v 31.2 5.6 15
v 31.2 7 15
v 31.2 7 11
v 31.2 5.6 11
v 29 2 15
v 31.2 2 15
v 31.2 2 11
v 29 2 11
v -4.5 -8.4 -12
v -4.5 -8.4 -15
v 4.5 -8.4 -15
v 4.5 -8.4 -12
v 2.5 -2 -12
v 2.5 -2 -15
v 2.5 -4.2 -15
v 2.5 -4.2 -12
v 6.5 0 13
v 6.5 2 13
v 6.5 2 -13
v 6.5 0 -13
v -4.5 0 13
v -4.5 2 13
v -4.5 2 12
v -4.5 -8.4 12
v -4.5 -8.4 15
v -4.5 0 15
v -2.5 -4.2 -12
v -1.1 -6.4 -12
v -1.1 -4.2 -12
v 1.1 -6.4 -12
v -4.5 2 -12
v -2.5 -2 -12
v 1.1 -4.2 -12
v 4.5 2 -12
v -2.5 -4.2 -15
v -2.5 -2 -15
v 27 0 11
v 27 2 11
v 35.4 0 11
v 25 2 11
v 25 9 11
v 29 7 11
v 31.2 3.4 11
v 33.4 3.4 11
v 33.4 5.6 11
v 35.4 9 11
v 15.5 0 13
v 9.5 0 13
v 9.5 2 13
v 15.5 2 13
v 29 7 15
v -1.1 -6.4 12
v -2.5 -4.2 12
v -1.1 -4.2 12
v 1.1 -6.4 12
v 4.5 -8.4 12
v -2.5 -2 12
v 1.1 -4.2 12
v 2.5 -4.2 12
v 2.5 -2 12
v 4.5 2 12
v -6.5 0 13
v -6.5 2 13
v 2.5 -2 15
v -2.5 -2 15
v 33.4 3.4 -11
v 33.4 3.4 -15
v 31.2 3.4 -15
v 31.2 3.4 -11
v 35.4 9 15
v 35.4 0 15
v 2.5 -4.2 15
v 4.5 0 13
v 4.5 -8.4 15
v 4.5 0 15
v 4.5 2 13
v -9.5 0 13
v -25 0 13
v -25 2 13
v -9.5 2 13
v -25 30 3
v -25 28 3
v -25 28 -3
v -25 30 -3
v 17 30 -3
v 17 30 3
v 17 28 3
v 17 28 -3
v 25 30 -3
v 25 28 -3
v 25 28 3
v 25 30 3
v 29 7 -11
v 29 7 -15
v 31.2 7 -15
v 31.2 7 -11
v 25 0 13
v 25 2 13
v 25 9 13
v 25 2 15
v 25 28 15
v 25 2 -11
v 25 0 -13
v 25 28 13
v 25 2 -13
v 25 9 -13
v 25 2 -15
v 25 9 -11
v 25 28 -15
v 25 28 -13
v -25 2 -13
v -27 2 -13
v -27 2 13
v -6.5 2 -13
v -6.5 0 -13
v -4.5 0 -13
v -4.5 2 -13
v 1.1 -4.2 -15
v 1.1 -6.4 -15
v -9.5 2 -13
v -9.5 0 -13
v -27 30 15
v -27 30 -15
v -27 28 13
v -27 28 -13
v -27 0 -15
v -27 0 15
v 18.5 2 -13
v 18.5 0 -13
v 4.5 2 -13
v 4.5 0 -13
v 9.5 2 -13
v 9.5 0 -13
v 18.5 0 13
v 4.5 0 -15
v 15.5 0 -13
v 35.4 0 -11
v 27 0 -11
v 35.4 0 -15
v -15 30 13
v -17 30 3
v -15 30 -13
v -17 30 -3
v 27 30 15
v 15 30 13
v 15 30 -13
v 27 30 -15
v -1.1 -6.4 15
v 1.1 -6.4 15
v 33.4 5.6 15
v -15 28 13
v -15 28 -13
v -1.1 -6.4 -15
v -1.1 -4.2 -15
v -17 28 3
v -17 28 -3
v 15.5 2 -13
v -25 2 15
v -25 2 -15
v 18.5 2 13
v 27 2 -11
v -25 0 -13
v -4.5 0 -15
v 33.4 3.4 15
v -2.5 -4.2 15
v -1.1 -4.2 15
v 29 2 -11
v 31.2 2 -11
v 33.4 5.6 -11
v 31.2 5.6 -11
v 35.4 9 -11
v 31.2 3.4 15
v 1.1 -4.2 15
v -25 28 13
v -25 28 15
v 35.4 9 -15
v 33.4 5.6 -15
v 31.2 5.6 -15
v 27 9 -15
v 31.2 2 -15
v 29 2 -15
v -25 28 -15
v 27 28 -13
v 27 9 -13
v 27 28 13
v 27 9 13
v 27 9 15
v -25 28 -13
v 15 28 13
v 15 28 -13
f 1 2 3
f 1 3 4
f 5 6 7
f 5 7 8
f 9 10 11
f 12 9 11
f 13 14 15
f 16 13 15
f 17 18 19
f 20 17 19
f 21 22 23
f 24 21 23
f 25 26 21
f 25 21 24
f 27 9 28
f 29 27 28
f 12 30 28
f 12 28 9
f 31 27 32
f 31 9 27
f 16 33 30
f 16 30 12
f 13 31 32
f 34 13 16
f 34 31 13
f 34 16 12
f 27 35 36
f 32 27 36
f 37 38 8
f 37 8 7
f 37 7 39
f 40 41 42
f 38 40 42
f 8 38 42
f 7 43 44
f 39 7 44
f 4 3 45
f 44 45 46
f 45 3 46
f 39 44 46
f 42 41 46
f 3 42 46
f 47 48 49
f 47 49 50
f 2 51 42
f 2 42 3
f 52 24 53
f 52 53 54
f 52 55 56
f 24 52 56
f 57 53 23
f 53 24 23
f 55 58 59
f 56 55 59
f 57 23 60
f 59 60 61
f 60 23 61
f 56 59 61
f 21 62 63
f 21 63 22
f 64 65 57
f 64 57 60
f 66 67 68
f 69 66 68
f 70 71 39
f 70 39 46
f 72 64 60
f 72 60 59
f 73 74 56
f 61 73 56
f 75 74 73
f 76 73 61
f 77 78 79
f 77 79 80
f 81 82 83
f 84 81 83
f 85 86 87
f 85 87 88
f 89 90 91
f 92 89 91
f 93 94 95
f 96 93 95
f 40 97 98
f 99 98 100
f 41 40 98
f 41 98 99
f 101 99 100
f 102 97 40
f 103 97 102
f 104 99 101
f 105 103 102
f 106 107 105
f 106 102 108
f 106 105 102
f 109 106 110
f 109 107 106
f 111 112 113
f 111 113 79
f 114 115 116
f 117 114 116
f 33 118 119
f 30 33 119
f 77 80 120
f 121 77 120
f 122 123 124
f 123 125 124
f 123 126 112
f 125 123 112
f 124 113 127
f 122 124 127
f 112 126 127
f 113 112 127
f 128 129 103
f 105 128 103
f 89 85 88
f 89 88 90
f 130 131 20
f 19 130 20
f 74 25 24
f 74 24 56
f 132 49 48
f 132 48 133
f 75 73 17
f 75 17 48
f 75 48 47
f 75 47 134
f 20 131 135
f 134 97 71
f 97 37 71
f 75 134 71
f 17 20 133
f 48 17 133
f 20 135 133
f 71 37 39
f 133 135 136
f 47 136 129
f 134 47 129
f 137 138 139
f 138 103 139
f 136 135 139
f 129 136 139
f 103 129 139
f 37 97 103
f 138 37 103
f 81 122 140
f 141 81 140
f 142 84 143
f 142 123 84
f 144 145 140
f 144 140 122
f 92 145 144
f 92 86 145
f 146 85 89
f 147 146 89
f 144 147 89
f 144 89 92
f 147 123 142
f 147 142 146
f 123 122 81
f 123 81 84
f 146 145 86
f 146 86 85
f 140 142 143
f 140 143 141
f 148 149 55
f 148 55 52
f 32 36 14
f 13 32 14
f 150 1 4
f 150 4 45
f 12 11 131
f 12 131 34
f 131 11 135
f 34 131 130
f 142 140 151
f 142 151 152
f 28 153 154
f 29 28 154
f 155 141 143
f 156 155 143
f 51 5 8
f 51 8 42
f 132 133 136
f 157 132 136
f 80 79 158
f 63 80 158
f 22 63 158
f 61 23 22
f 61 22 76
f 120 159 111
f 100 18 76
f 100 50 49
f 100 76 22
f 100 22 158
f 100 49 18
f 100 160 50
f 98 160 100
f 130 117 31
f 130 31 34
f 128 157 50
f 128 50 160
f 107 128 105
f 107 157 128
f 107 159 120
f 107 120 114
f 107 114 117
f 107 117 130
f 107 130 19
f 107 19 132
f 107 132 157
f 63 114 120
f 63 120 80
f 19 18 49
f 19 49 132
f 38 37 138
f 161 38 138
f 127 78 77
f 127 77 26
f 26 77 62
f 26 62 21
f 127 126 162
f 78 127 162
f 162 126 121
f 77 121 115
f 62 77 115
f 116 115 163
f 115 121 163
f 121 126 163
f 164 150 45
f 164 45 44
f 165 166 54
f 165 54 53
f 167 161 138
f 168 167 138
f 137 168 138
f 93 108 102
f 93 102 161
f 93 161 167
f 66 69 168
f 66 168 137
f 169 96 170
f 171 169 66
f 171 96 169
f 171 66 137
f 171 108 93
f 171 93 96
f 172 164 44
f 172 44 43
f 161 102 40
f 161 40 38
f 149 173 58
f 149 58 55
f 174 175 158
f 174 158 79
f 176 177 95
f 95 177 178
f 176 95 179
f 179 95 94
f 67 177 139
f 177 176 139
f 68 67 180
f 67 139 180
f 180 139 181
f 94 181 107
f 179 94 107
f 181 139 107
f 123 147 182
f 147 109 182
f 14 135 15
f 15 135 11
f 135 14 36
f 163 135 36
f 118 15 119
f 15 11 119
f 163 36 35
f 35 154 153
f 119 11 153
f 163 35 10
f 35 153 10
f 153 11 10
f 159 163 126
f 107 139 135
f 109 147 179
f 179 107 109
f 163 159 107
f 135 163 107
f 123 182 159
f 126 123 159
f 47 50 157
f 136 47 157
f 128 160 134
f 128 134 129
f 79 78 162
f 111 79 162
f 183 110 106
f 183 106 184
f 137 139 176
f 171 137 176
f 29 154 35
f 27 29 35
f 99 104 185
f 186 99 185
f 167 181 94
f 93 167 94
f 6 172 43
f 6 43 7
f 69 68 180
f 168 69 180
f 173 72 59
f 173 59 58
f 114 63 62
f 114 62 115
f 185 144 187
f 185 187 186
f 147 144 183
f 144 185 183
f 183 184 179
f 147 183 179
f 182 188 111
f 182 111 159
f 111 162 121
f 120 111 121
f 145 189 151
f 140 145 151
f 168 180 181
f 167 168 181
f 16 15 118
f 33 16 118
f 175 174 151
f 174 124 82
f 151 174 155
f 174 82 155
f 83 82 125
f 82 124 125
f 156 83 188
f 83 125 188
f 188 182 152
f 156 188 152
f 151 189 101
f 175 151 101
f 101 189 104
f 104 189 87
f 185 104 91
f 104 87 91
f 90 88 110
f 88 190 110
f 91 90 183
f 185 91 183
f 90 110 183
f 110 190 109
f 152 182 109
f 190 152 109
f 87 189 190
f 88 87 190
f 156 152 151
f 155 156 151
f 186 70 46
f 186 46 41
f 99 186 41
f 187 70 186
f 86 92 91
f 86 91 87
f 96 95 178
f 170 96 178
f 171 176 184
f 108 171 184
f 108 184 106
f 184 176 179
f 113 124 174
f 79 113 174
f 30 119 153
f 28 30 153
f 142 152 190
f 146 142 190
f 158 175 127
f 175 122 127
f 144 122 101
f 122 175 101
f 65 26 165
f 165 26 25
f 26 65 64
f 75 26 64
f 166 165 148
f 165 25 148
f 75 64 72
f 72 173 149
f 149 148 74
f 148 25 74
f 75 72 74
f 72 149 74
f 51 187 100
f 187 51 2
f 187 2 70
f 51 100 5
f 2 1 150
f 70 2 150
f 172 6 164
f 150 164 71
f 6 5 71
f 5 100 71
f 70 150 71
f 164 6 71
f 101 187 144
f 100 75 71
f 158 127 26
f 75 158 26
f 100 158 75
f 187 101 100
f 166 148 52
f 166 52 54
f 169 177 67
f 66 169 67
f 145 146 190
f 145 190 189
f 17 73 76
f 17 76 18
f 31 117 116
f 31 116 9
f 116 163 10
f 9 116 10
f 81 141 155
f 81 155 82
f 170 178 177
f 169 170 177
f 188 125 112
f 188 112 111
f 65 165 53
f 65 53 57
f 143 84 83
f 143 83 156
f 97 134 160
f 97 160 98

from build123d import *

# Parameters (mm, degrees)
SKETCH1_W           = 54
SKETCH1_H           = 30
SKETCH1_W_2         = 50
SKETCH1_H_2         = 26
BOSS_EXTRUDE1_DEPTH = 2
SKETCH2_W           = 2
SKETCH2_H           = 2
BOSS_EXTRUDE2_DEPTH = 28
SKETCH3_W           = 2
SKETCH3_H           = 9
BOSS_EXTRUDE3_DEPTH = 4
BOSS_EXTRUDE4_DEPTH = 3
SKETCH6_W           = 2
SKETCH6_H           = 2
BOSS_EXTRUDE5_DEPTH = 2
SKETCH10_W          = 3
SKETCH10_H          = 26
BOSS_EXTRUDE7_DEPTH = 2
SKETCH11_W          = 2
SKETCH11_H          = 6
BOSS_EXTRUDE9_DEPTH = 2


with BuildPart() as part:
    # Sketch1 → Boss-Extrude1 (new body)
    with BuildSketch(Plane(origin=(0, 0, 0), x_dir=(1, 0, 0), z_dir=(0, 1, 0))):
        Rectangle(SKETCH1_W, SKETCH1_H)
        Rectangle(SKETCH1_W_2, SKETCH1_H_2, mode=Mode.SUBTRACT)
    extrude(amount=BOSS_EXTRUDE1_DEPTH)

    # Sketch2 → Boss-Extrude2 (add)
    with BuildSketch(Plane(origin=(0, 0, 0), x_dir=(1, 0, 0), z_dir=(0, 1, 0))):
        with Locations((26, 14)):
            Rectangle(SKETCH2_W, SKETCH2_H)
        with Locations((26, -14)):
            Rectangle(SKETCH2_W, SKETCH2_H)
        with Locations((-26, -14)):
            Rectangle(SKETCH2_W, SKETCH2_H)
        with Locations((-26, 14)):
            Rectangle(SKETCH2_W, SKETCH2_H)
    extrude(amount=BOSS_EXTRUDE2_DEPTH)

    # Sketch3 → Boss-Extrude3 (add)
    with BuildSketch(Plane.XY.offset(15)):
        Polygon((27, 9), (27, 4.5), (29, 4.5), (29, 7), (31.2, 7), (31.2, 5.6), (33.4, 5.6), (33.4, 4.5), (35.4, 4.5), (35.4, 9), align=None)
        Polygon((27, 4.5), (27, 0), (35.4, 0), (35.4, 4.5), (33.4, 4.5), (33.4, 3.4), (31.2, 3.4), (31.2, 2), (29, 2), (29, 4.5), align=None)
        with Locations((26, 4.5)):
            Rectangle(SKETCH3_W, SKETCH3_H)
    boss_extrude3 = extrude(amount=-BOSS_EXTRUDE3_DEPTH)

    # Mirror1: Boss-Extrude3 across plane
    add(boss_extrude3.mirror(Plane.XY))

    # Sketch4 → Boss-Extrude4 (add)
    with BuildSketch(Plane.XY.offset(15)):
        Polygon((-4.5, 0), (0, 0), (4.5, 0), (4.5, 2), (-4.5, 2), align=None)
        Polygon((4.5, 0), (0, 0), (-4.5, 0), (-4.5, -8.4), (0, -8.4), (4.5, -8.4), align=None)
        Polygon((1.1, -6.4), (0, -6.4), (-1.1, -6.4), (-1.1, -4.2), (-2.5, -4.2), (-2.5, -2), (2.5, -2), (2.5, -4.2), (1.1, -4.2), align=None, mode=Mode.SUBTRACT)
    boss_extrude4 = extrude(amount=-BOSS_EXTRUDE4_DEPTH)

    # Mirror2: Boss-Extrude4 across plane
    add(boss_extrude4.mirror(Plane.XY))

    # Sketch6 → Boss-Extrude5 (add)
    with BuildSketch(Plane(origin=(0, 28, 0), x_dir=(1, 0, 0), z_dir=(0, 1, 0))):
        with Locations((26, -14)):
            Rectangle(SKETCH6_W, SKETCH6_H)
        Polygon((-27, -15), (25, -15), (25, -13), (27, -13), (27, 15), (-27, 15), align=None)
        Polygon((25, 6), (25, -13), (-25, -13), (-25, -9), (-25, 6), (-25, 9), (-25, 13), (25, 13), (25, 9), align=None, mode=Mode.SUBTRACT)
    extrude(amount=BOSS_EXTRUDE5_DEPTH)

    # Sketch10 → Boss-Extrude7 (add)
    with BuildSketch(Plane(origin=(0, 2, 0), x_dir=(1, 0, 0), z_dir=(0, 1, 0))):
        with Locations((8, 0)):
            Rectangle(SKETCH10_W, SKETCH10_H)
        with Locations((-8, 0)):
            Rectangle(SKETCH10_W, SKETCH10_H)
        with Locations((17, 0)):
            Rectangle(SKETCH10_W, SKETCH10_H)
    extrude(amount=-BOSS_EXTRUDE7_DEPTH)

    # Sketch11 → Boss-Extrude9 (add)
    with BuildSketch(Plane(origin=(0, 30, 0), x_dir=(1, 0, 0), z_dir=(0, 1, 0))):
        Polygon((15, -3), (15, -13), (25, -13), (25, -3), (17, -3), align=None)
        with Locations((16, 0)):
            Rectangle(SKETCH11_W, SKETCH11_H)
        Polygon((15, 13), (15, 3), (17, 3), (25, 3), (25, 13), align=None)
        Polygon((-17, 3), (-15, 3), (-15, 13), (-25, 13), (-25, 3), align=None)
        Polygon((-25, -3), (-25, -13), (-15, -13), (-15, -3), (-17, -3), align=None)
        with Locations((-16, 0)):
            Rectangle(SKETCH11_W, SKETCH11_H)
    extrude(amount=-BOSS_EXTRUDE9_DEPTH)


solid = part.part
